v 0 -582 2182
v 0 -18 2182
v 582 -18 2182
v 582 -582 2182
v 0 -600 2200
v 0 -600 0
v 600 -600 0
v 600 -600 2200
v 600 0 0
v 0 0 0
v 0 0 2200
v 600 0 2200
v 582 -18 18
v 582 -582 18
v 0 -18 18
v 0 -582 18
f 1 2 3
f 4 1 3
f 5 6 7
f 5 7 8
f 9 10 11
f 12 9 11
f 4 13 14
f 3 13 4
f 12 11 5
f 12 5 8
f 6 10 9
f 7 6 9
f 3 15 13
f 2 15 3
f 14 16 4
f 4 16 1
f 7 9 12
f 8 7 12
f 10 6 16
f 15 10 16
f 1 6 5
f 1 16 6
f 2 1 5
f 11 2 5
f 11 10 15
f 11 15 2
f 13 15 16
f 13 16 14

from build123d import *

# Parameters (mm, degrees)
F0_W     = 40.8606864512
F0_H     = 43.7535122037
F1_DEPTH = 600
F2_DEPTH = 600
F3_DEPTH = 2200
F4_T     = -18


with BuildPart() as f1:
    # F0 (on Right) → F1 (new body)
    with BuildSketch(Plane.YZ):
        with Locations((-20.4303432256, 21.8767561018)):
            Rectangle(F0_W, F0_H)
    extrude(amount=F1_DEPTH)

    # F2 (add): a face of the model
    f2_faces = [f1.faces().sort_by_distance(p)[0] for p in [
        (300, 0, 21.8767561018),
    ]]
    extrude(f2_faces, amount=-F2_DEPTH)

    # F3 (add): a face of the model
    f3_faces = [f1.faces().sort_by_distance(p)[0] for p in [
        (300, -300, 0),
    ]]
    extrude(f3_faces, amount=-F3_DEPTH)

    # F4
    f4_openings = [f1.faces().sort_by_distance(p)[0] for p in [
        (0, -300, 1100),
    ]]
    offset(amount=F4_T, openings=f4_openings)


solid = f1.part
